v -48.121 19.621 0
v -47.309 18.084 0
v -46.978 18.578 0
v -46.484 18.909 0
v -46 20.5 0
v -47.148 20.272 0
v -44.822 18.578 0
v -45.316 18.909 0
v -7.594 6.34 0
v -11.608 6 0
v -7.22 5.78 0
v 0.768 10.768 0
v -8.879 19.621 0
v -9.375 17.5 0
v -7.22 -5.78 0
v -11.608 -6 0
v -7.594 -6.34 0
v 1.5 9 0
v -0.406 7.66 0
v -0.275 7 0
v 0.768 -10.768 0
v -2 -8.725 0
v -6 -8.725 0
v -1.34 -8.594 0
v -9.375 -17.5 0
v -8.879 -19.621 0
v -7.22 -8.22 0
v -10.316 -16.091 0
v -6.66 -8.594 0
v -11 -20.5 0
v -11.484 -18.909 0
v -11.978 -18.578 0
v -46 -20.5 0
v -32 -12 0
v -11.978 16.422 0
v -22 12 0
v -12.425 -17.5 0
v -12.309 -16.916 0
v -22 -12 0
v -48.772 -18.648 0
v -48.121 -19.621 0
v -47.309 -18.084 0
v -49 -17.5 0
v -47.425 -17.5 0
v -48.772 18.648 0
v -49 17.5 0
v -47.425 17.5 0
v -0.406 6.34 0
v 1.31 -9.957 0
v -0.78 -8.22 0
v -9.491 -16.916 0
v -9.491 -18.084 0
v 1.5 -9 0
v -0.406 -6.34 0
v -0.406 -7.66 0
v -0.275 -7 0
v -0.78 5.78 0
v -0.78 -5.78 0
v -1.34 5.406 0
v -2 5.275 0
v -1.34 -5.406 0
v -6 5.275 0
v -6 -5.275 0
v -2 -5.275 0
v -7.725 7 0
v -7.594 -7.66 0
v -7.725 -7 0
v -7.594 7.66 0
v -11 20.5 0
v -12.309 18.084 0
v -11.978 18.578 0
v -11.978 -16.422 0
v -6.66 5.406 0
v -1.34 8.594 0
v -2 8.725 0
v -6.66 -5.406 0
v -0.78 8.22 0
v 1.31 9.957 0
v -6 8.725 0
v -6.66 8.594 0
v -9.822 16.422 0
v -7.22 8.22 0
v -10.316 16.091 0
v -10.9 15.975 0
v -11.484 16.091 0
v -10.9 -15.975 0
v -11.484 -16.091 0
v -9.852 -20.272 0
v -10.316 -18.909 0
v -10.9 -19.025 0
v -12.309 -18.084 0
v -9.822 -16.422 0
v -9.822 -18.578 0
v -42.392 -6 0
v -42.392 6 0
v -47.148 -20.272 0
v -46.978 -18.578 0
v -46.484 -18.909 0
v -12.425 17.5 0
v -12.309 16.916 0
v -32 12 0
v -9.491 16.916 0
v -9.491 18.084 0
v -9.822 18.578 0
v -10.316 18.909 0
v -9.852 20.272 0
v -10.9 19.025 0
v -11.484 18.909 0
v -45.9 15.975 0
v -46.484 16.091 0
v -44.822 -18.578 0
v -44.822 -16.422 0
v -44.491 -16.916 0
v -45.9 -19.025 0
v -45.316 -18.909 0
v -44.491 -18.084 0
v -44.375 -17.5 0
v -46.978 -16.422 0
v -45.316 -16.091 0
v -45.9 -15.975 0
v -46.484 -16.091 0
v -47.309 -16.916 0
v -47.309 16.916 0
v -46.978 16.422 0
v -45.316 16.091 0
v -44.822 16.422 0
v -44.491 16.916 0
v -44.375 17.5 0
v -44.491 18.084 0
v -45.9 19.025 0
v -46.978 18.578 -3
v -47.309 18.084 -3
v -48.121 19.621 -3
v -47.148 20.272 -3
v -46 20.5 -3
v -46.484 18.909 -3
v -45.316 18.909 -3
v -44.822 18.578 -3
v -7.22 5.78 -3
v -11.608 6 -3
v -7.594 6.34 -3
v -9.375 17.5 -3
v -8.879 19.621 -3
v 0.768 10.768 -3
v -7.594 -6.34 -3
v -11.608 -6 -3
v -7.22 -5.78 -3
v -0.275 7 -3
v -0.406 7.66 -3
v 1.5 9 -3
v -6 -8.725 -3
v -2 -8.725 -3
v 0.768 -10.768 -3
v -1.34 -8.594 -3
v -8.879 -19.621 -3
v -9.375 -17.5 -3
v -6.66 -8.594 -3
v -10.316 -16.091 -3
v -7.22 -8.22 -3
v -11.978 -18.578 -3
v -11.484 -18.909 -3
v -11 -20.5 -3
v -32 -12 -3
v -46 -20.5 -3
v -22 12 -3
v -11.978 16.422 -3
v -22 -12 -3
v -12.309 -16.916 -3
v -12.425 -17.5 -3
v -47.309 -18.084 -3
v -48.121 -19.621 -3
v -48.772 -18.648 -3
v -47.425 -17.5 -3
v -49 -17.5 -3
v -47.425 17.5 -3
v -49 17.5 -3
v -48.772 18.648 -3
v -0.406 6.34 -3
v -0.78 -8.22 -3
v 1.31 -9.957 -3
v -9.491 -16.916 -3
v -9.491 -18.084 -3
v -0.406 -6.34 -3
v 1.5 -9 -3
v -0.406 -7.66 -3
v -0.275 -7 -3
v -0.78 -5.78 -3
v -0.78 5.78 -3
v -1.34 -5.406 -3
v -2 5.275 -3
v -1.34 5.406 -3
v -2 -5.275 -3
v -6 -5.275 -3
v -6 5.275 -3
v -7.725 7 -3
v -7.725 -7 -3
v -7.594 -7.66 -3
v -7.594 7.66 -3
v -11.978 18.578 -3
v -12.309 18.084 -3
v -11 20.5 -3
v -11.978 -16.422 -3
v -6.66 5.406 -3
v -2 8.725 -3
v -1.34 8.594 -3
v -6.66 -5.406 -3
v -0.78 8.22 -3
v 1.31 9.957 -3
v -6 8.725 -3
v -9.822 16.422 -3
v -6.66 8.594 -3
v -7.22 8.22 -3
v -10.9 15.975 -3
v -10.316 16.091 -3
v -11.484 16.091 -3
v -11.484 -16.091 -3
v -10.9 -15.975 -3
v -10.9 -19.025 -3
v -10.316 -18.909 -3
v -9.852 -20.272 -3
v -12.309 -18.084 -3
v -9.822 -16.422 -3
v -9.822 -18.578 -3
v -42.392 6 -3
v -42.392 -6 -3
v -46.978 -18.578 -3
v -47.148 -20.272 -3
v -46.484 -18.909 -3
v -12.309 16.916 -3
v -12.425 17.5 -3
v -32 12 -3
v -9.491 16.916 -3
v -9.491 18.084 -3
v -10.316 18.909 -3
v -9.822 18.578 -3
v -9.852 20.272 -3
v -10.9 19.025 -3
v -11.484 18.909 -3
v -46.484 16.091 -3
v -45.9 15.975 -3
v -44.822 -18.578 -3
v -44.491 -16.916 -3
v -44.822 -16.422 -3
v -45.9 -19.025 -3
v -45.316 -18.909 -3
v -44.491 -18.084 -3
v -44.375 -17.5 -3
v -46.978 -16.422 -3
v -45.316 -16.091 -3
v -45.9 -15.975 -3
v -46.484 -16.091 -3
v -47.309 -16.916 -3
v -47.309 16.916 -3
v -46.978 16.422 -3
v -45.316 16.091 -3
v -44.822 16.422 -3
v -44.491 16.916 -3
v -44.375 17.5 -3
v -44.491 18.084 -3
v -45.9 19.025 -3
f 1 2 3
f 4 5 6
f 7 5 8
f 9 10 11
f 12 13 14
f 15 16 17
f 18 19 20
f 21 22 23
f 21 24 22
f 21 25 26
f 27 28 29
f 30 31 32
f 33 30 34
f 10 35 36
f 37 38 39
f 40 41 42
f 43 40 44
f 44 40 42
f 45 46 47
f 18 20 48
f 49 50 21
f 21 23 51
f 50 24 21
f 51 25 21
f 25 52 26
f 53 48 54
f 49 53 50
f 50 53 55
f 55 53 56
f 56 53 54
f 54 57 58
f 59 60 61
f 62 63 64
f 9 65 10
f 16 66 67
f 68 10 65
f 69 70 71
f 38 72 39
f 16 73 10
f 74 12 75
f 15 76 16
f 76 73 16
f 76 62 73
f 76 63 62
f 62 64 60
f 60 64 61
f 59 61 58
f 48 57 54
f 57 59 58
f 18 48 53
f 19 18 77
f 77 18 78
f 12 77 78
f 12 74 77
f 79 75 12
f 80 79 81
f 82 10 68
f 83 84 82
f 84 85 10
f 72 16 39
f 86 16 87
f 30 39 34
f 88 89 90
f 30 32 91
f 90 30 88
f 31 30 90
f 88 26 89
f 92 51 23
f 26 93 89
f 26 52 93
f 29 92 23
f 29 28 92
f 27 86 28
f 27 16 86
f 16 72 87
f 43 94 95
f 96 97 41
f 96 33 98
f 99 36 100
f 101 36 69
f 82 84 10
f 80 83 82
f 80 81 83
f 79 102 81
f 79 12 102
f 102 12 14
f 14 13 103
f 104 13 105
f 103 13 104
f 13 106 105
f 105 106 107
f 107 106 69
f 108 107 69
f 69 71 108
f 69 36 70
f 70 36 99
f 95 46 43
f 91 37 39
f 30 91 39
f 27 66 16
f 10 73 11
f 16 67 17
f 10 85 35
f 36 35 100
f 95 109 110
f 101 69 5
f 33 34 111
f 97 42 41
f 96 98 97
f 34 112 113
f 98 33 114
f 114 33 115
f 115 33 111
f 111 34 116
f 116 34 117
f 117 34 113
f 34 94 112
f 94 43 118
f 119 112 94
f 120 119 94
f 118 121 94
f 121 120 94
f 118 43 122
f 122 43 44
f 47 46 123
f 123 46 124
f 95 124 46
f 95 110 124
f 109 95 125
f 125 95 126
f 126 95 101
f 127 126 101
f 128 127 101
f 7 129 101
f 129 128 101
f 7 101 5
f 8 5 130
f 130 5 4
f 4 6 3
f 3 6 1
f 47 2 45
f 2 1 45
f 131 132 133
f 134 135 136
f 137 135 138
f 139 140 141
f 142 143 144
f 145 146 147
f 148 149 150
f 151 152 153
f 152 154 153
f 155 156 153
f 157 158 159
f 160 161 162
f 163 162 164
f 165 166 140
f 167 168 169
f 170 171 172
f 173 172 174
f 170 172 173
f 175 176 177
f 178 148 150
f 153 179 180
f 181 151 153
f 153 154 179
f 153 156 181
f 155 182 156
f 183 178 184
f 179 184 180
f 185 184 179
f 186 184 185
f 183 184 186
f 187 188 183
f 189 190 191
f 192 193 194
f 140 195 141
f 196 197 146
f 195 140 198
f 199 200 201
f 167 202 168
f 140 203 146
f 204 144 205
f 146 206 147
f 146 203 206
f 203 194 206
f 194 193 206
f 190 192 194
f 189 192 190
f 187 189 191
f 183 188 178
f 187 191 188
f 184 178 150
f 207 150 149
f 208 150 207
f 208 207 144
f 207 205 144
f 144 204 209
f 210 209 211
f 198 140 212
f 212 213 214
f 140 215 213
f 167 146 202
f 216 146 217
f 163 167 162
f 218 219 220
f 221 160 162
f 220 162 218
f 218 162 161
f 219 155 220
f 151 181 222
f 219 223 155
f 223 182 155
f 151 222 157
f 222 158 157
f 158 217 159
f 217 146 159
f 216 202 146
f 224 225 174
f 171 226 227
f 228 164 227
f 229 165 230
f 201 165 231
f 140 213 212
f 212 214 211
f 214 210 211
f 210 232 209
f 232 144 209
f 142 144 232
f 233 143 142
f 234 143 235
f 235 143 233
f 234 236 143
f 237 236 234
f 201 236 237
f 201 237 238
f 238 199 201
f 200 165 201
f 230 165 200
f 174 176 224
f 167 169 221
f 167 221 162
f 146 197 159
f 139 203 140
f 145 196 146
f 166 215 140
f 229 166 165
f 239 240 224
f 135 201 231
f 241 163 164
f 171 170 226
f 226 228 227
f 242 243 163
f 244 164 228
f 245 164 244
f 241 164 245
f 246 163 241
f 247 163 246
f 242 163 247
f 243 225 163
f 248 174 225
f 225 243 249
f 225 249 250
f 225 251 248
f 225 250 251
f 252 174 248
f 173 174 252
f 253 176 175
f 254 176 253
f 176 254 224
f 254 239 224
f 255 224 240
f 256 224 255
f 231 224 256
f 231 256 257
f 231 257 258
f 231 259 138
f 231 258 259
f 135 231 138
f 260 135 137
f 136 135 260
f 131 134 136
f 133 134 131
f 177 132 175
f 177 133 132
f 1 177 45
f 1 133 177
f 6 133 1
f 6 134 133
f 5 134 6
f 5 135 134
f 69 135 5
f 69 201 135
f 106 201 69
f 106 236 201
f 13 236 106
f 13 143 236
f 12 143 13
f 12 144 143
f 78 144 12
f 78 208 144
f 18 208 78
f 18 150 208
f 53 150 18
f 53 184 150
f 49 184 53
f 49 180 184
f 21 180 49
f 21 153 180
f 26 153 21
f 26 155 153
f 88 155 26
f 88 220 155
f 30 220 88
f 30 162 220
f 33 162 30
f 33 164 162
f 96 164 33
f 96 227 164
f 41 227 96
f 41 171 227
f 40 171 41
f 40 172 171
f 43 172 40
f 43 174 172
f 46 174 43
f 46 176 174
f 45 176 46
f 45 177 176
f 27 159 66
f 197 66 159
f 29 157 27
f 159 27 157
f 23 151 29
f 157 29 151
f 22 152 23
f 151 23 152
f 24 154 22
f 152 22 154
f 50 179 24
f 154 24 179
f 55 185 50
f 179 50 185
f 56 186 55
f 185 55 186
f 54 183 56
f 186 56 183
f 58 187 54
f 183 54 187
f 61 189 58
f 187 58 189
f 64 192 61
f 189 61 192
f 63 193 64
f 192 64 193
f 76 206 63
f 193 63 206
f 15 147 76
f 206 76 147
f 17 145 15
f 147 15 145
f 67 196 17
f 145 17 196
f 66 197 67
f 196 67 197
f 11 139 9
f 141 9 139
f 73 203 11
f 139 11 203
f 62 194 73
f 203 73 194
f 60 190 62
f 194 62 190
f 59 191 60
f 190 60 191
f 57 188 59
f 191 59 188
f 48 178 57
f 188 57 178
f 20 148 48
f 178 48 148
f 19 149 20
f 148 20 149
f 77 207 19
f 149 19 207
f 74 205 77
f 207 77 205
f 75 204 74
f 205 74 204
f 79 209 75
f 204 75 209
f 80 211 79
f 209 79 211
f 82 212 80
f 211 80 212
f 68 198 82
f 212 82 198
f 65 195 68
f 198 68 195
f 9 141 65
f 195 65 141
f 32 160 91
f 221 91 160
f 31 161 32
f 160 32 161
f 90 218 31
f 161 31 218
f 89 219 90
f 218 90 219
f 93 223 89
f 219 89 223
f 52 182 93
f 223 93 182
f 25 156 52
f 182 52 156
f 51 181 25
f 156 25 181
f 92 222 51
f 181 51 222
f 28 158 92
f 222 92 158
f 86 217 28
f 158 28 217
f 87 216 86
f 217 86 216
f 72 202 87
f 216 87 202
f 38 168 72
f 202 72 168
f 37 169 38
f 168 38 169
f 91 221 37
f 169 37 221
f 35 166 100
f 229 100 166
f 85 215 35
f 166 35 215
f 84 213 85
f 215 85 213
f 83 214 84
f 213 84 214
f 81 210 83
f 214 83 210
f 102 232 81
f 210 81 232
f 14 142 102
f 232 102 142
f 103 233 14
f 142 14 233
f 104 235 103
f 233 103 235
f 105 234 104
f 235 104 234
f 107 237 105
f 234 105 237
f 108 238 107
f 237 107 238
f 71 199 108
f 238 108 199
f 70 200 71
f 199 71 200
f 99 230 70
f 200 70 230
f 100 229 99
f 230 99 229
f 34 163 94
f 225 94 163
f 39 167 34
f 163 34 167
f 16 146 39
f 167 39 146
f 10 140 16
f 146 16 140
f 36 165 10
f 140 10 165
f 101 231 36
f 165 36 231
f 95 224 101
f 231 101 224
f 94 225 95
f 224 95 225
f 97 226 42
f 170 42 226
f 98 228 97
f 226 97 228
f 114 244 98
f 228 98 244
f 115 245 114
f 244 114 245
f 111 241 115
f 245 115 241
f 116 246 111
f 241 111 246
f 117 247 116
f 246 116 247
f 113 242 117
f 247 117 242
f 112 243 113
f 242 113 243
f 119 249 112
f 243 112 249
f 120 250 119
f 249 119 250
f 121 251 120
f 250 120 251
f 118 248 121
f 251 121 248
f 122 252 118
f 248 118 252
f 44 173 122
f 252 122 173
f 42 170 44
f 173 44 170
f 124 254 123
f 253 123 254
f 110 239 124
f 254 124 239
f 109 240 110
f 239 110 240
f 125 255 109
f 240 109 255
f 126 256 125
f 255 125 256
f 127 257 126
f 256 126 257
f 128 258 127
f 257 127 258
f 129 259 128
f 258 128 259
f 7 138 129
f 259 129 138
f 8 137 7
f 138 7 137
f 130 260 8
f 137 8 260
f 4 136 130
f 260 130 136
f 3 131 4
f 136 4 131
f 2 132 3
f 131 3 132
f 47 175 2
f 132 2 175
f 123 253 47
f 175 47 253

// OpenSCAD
// file: effector.scad
include <configuration.scad>
use <retainer.scad>

separation = 40;  // Distance between ball joint mounting faces.
offset = 20;  // Same as DELTA_EFFECTOR_OFFSET in Marlin.
mount_radius = 12.5;  // Hotend mounting screws, standard would be 25mm.
hotend_radius = 8;  // Hole for the hotend (J-Head diameter is 16mm).
push_fit_height = 4;  // Length of brass threaded into printed plastic.
push_fit_radius = 5;
height = 8;
cone_r1 = 2.5;
cone_r2 = 14;

probe_angle = 60; // angle where the Z-probe goes through effector

hotend_top_shelf_height = 3.7;


module effector() {
  difference() {
    union() {
      cylinder(r=offset-3, h=height, center=true, $fn=60);
      for (a = [60:120:359]) rotate([0, 0, a]) {
        rotate([0, 0, 30]) translate([offset-2, 0, 0])
          cube([10, 13, height], center=true);
        for (s = [-1, 1]) scale([s, 1, 1]) {
          translate([0, offset, 0]) difference() {
            intersection() {
              cube([separation, 40, height], center=true);
              translate([0, -4, 0]) rotate([0, 90, 0])
                cylinder(r=10, h=separation, center=true);
              translate([separation/2-7, 0, 0]) rotate([0, 90, 0])
                cylinder(r1=cone_r2, r2=cone_r1, h=14, center=true, $fn=24);
            }
            rotate([0, 90, 0])
              cylinder(r=m3_radius, h=separation+1, center=true, $fn=12);
            rotate([90, 0, 90])
              cylinder(r=m3_nut_radius, h=separation-24, center=true, $fn=6);
          }
        }
      }
    }
    translate([0, 0, height/2 - hotend_top_shelf_height])
      cylinder(r=hotend_radius + 2*extra_radius, h=height, $fn=36);
    translate([0, 0, -6]) cylinder(r=push_fit_radius, h=height);
    for (a = [0:60:359]) rotate([0, 0, a]) {
      if (a != probe_angle)
        translate([0, mount_radius, 0])
          cylinder(r=m3_wide_radius, h=2*height, center=true, $fn=12);
    }
    rotate([0, 0, probe_angle]) {
      translate([0, mount_radius+probe_excentricity, 0])
        cylinder(r=probe_tunnel_radius+0.1, h=2*height, center=true, $fn=12);
    }
  }
}

module e3dv6() {
    translate([0, 0, -17.66])
    rotate([90, 0, 0])
    color("lightgrey")
    import("reference/E3D_V6_1.75mm_Universal_HotEnd_Mockup.stl");
}


%translate([0, 0, 8])
rotate([180, 0, 0]) {
    e3dv6();
    translate([0, 0, -2.6])
    retainer();
}

translate([0, 0, height/2]) effector();
// file: retainer.scad
include <configuration.scad>;

offset = 20;  // Same as DELTA_EFFECTOR_OFFSET in Marlin.
mount_radius = 12.5;  // Hotend mounting screws, standard would be 25mm.
height = 5;

groove_radius = 6;

probe_angle = 240;
probe_spring_radius = 2.5;
probe_spring_recess_depth = 2;

nut_slot_height = 2.7;
layer_height = 0.2;

module retainer() {
  difference() {
    union() {
      cylinder(r=offset-3, h=height, center=true, $fn=60);
      *rotate([0, 0, probe_angle]) {
        translate([0, mount_radius+probe_excentricity, 0])
          cylinder(r=probe_tunnel_radius*3, h=height, center=true, $fn=12);
      }
    }
    cylinder(r=groove_radius + extra_radius, h=height+1, center=true);
    for (a = [0:60:359]) //if (a != probe_angle) 
    rotate([0, 0, a]) {
      translate([0, mount_radius, 0]) {
        translate([0,0,-height/2 - 0.01]) {
           nut_slot();
           cylinder(r=m3_wide_radius, h=2*height,$fn=12);
        }
      }
    }
    *rotate([0, 0, probe_angle]) {
      translate([0, mount_radius+probe_excentricity, 0])
        union() {
          cylinder(r=probe_tunnel_radius, h=2*height, center=true, $fn=12);
          translate([0, 0, -height/2])
            cylinder(r=probe_spring_radius, h=probe_spring_recess_depth, center=true, $fn=12);
        }
    }
    // Groove mount insert slot.
    translate([0, 10, 0])
      cube([2*groove_radius, 20, 20], center=true);
  }
}

module nut_slot(radius=m3_nut_tight_radius,height=nut_slot_height) {
	rotate([0,0,30])
		cylinder(r=m3_nut_tight_radius, h=nut_slot_height, $fn=6);
}

translate([0, 0, height/2])
rotate([180,0,0])
  retainer();
// file: configuration.scad
// Increase this if your slicer or printer make holes too tight.
extra_radius = 0.1;

// OD = outside diameter, corner to corner.
m3_nut_od = 6.1;
m3_nut_radius = m3_nut_od/2 + 0.2 + extra_radius;
m3_nut_tight_radius = m3_nut_radius - extra_radius/2;
m3_washer_radius = 3.5 + extra_radius;

// Major diameter of metric 3mm thread.
m3_major = 2.85;
m3_radius = m3_major/2 + extra_radius;
m3_wide_radius = m3_major/2 + extra_radius + 0.2;

// NEMA17 stepper motors.
motor_shaft_diameter = 5;
motor_shaft_radius = motor_shaft_diameter/2 + extra_radius;

// Frame brackets. M3x8mm screws work best with 3.6 mm brackets.
thickness = 3.6;

// OpenBeam or Misumi. Currently only 15x15 mm, but there is a plan
// to make models more parametric and allow 20x20 mm in the future.
extrusion = 15;

// Placement for the NEMA17 stepper motors.
motor_offset = 44;
motor_length = 47;

probe_tunnel_radius = 1.25 + extra_radius;
probe_excentricity = 5;
// main file
include <configuration.scad>;
use <retainer.scad>
use <effector.scad>

height = 8;

lateral_spacing = 18;
thickness=3;

module blower_with_duct() {
    import("reference/turbo_fan_40x40x10_noname_fan.stl");

    translate([0, 5,-23])
    difference() {
        intersection() {
            cube([40,10,6], center=true);
            
            translate([0,3.5,5])
            rotate([0, 90 ,0])
            cylinder(h=100, d=18, $fn=32, center=true);
        }
        translate([0,5,0])
        cube([38,8,5], center=true);
    }
}

module retainer_with_blower_holder() {
    retainer();
    
    difference() {
    
        for(a=[0,180])
        rotate([0,0,a])
        translate([lateral_spacing,0,0])
        {
            rotate([90,0,90])
            linear_extrude(thickness) {
                hull()
                for(x=[-1,1]) {
                    for(y=[-11,-46])
                    translate([x*17.5,y])
                    circle(d=6, $fn=16);

                    for(y=[0])
                    translate([x*9,y])
                    circle(d=5, $fn=16);
                }
            }
        }
        
        translate([0,0,-28.4])
        for(x=[-1,1],y=[-1,1])
        translate([0,x*17.5,y*17.5])
        rotate([90, 0, 90])
        cylinder(r=m3_radius, h=100, center=true, $fn=16);
        
        hull() {
            for(z=[-22,-32])
            translate([0, 0, z])
            rotate([90, 0, 90])
            cylinder(d=24, h=100, center=true, $fn=6);
        }
    }
}

module retainer_with_attachment_holes() {
    retainer();
    
    for(a=[0,180])
    rotate([0,0,a])
    translate([14.5,0,2.5])
    rotate([90,0,90])
    linear_extrude(4)
    difference() {
        translate([0, -3])
        {
            hull()
            for(x=[-1,1], y=[0,-5]) {
                translate([x*8, y])
                circle(d=6, $fn=16);
            }
        }

        for(x=[-1,1])
        translate([x*7,-7])
        circle(r=m3_radius, $fn=16);
    }
}

module blower_attachment() {
    rotate([90,0,90])
    linear_extrude(thickness)
    difference() {
        hull()
        for(x=[-1,1]) {
            for(y=[-11,-46])
            translate([x*17.5,y])
            circle(d=6, $fn=16);

            translate([x*9,-1])
            circle(d=5, $fn=16);
        }
    
        translate([0, -28.4])
        for(x=[-1,1],y=[-1,1])
        translate([x*17.5, y*17.5])
        circle(r=m3_radius, $fn=16);
        
        hull() {
            for(y=[-22,-32])
            translate([0, y])
            circle(d=24, $fn=6);
        }

        for(x=[-1,1])
        translate([x*7,-6])
        hull()
        for(y=[0,4])
        translate([0,y])
        circle(r=m3_wide_radius, $fn=16);
        
    
    }
}

%color("lightblue") translate([0, 0, height/2]) effector();

translate([0, 0, 8])
rotate([180, 0, 0]) {
    %translate([0, 0, 0])
    e3dv6();
    
    translate([0, 0, -2.6])
    retainer_with_attachment_holes();
    
    %
    for(a=[0, 180]) rotate([0, 0, a])
    translate([18.5, 0, (a>0 ? -4.2: -1.5)])
    {
        blower_attachment();
        translate([10 + thickness,0,-28.4])
        rotate([0,0,90])
        blower_with_duct();
    }
 
    *translate([0, 0, -2.5])
    retainer_with_blower_holder();
}

*
rotate([180,0,0])
retainer_with_attachment_holes();

!rotate([0,90,0])
blower_attachment();
